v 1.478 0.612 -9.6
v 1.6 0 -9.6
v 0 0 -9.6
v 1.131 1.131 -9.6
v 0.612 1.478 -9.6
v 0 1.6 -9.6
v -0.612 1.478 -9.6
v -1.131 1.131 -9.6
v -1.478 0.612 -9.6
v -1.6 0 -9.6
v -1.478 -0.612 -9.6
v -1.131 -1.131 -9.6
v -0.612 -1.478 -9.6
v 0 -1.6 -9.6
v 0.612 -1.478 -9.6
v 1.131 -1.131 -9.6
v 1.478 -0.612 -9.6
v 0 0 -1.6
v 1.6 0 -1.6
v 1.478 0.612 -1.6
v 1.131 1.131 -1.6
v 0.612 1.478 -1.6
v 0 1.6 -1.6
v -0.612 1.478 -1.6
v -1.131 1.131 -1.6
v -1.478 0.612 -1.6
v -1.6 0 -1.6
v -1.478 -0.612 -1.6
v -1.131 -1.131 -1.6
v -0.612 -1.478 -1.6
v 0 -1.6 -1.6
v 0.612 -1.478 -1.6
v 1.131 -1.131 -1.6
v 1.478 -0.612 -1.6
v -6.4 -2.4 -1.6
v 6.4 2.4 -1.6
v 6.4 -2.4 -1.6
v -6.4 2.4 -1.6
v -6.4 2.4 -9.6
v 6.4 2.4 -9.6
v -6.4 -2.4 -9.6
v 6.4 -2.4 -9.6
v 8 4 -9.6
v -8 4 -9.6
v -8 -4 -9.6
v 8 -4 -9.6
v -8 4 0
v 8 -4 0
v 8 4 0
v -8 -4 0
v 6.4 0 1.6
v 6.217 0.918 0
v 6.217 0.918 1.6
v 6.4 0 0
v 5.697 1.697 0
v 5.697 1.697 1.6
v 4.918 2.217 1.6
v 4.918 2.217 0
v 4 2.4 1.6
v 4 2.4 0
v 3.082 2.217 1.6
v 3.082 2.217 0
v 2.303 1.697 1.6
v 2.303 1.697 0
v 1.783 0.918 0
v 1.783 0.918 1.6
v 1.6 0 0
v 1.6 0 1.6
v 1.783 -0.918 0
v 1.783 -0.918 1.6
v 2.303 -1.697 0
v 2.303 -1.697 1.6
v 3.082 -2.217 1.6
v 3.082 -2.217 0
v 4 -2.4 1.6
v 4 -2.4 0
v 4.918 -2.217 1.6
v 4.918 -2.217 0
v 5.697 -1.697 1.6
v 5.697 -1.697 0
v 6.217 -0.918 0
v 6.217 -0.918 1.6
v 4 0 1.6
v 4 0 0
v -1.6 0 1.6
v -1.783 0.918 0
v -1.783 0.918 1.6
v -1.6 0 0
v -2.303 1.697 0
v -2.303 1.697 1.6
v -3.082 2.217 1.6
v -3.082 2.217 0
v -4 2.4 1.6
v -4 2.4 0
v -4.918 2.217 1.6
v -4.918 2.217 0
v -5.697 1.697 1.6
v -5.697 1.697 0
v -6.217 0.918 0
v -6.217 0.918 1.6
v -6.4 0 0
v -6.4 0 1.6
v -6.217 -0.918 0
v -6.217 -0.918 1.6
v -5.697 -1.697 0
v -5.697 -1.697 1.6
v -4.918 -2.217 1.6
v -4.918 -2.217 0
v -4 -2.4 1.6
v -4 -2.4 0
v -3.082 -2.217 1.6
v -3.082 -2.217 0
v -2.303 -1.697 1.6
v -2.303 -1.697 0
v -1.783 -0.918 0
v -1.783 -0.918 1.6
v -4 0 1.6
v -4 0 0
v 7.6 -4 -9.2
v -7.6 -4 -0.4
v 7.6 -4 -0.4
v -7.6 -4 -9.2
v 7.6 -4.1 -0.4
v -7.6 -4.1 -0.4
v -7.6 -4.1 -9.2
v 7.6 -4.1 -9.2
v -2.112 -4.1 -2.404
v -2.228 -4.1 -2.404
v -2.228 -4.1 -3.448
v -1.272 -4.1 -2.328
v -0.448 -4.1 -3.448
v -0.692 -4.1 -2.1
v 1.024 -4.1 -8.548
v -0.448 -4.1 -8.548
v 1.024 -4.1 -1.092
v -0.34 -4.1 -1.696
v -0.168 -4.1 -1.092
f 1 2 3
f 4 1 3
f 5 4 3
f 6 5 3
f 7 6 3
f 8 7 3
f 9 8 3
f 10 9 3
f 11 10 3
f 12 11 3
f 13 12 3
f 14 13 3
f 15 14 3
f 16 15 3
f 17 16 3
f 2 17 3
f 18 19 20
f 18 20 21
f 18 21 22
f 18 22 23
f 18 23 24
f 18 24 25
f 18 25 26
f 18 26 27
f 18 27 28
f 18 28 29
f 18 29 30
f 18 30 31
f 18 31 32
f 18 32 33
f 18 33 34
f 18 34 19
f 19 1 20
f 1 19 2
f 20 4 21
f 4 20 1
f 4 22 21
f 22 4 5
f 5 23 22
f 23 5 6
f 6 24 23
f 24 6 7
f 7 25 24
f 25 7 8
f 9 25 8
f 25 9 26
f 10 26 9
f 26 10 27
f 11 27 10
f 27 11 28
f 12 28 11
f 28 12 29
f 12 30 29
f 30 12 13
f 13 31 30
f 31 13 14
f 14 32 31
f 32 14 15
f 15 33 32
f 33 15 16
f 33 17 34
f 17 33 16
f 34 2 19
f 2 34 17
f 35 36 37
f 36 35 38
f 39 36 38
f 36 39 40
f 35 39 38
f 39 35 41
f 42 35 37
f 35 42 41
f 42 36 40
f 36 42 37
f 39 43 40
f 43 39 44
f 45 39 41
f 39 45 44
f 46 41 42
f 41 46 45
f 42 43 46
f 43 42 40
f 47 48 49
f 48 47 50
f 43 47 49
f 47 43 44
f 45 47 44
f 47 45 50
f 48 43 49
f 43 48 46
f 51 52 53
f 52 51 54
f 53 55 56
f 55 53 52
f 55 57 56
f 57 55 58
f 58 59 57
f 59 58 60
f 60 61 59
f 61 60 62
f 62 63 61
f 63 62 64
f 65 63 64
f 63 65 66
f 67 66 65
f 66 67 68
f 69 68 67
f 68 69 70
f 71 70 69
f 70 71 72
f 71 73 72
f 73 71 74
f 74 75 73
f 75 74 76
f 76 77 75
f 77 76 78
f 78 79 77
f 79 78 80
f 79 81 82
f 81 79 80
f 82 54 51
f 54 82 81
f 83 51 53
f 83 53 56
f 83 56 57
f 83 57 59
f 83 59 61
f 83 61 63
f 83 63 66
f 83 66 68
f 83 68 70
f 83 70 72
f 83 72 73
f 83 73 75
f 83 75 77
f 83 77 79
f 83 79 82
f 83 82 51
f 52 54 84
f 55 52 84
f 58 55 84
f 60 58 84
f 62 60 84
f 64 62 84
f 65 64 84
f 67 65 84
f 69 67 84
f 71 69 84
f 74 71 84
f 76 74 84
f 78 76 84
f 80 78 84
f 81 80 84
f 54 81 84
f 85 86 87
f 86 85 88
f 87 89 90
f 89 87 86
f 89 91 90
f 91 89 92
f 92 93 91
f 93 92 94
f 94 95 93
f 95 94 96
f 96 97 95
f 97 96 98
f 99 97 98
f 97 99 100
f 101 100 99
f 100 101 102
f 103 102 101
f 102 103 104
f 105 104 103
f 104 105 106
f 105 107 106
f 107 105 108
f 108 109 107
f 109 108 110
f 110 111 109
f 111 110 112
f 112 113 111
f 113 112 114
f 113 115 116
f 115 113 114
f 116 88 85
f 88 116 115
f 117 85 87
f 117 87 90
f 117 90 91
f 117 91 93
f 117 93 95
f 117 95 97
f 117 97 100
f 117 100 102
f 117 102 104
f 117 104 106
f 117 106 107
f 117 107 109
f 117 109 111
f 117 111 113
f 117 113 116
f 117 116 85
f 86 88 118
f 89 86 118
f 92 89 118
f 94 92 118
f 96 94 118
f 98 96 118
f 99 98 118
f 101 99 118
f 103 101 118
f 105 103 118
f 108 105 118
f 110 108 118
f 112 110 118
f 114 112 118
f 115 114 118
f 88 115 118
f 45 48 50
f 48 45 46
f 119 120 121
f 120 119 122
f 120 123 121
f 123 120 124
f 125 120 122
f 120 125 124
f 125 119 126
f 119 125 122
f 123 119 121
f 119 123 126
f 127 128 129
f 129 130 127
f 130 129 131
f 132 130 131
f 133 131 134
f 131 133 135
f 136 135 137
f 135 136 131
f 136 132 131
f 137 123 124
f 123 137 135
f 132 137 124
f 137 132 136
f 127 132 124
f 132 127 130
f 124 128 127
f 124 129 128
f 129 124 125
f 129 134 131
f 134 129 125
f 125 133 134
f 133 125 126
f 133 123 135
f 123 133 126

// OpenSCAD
// file: ../p/4-4edge.scad
use <../lib.scad>
function ldraw_lib__4_4edge() = [
// 0 Circle 1.0
// 0 Name: 4-4edge.dat
// 0 Author: James Jessiman
// 0 !LDRAW_ORG Primitive UPDATE 2017-01
// 0 !LICENSE Licensed under CC BY 2.0 and CC BY 4.0 : see CAreadme.txt
// 
// 0 BFC CERTIFY CCW
  [0,"BFC","CERTIFY"],
  [0,"BFC","CCW"],
// 
// 0 !HISTORY 1998-12-15 [PTadmin] Official Update 1998-10
// 0 !HISTORY 2005-12-28 [PTadmin] Official Update 2005-01
// 0 !HISTORY 2007-06-24 [PTadmin] Header formatted for Contributor Agreement
// 0 !HISTORY 2008-07-01 [PTadmin] Official Update 2008-01
// 0 !HISTORY 2017-01-15 [Steffen] BFCed
// 0 !HISTORY 2017-12-30 [PTadmin] Official Update 2017-01
// 
// 
// 2 24 1 0 0 0.9239 0 0.3827
  [2,24,1,0,0,0.9239,0,0.3827],
// 2 24 0.9239 0 0.3827 0.7071 0 0.7071
  [2,24,0.9239,0,0.3827,0.7071,0,0.7071],
// 2 24 0.7071 0 0.7071 0.3827 0 0.9239
  [2,24,0.7071,0,0.7071,0.3827,0,0.9239],
// 2 24 0.3827 0 0.9239 0 0 1
  [2,24,0.3827,0,0.9239,0,0,1],
// 2 24 0 0 1 -0.3827 0 0.9239
  [2,24,0,0,1,-0.3827,0,0.9239],
// 2 24 -0.3827 0 0.9239 -0.7071 0 0.7071
  [2,24,-0.3827,0,0.9239,-0.7071,0,0.7071],
// 2 24 -0.7071 0 0.7071 -0.9239 0 0.3827
  [2,24,-0.7071,0,0.7071,-0.9239,0,0.3827],
// 2 24 -0.9239 0 0.3827 -1 0 -0
  [2,24,-0.9239,0,0.3827,-1,0,-0],
// 2 24 -1 0 -0 -0.9239 0 -0.3827
  [2,24,-1,0,-0,-0.9239,0,-0.3827],
// 2 24 -0.9239 0 -0.3827 -0.7071 0 -0.7071
  [2,24,-0.9239,0,-0.3827,-0.7071,0,-0.7071],
// 2 24 -0.7071 0 -0.7071 -0.3827 0 -0.9239
  [2,24,-0.7071,0,-0.7071,-0.3827,0,-0.9239],
// 2 24 -0.3827 0 -0.9239 0 0 -1
  [2,24,-0.3827,0,-0.9239,0,0,-1],
// 2 24 0 0 -1 0.3827 0 -0.9239
  [2,24,0,0,-1,0.3827,0,-0.9239],
// 2 24 0.3827 0 -0.9239 0.7071 0 -0.7071
  [2,24,0.3827,0,-0.9239,0.7071,0,-0.7071],
// 2 24 0.7071 0 -0.7071 0.9239 0 -0.3827
  [2,24,0.7071,0,-0.7071,0.9239,0,-0.3827],
// 2 24 0.9239 0 -0.3827 1 0 0
  [2,24,0.9239,0,-0.3827,1,0,0],
];
module ldraw_lib__4_4edge(step=0, col=false, unit=2/5, alt=false, line=0.2, solid=!$preview)
    makepoly(ldraw_lib__4_4edge(), step=step, col=col, unit=unit, alt=alt, line=line, solid=solid);
ldraw_lib__4_4edge(line=0.2);
// file: ../p/4-4disc.scad
use <../lib.scad>
function ldraw_lib__4_4disc() = [
// 0 Disc 1.0
// 0 Name: 4-4disc.dat
// 0 Author: James Jessiman
// 0 !LDRAW_ORG Primitive UPDATE 2002-02
// 0 !LICENSE Licensed under CC BY 2.0 and CC BY 4.0 : see CAreadme.txt
// 
// 0 BFC CERTIFY CCW
  [0,"BFC","CERTIFY"],
  [0,"BFC","CCW"],
// 
// 0 !HISTORY 1998-12-15 [PTadmin] Official Update 1998-10
// 0 !HISTORY 2002-03-23 [sbliss] Added BFC statement
// 0 !HISTORY 2002-04-25 [PTadmin] Official Update 2002-02
// 0 !HISTORY 2007-06-24 [PTadmin] Header formatted for Contributor Agreement
// 0 !HISTORY 2008-07-01 [PTadmin] Official Update 2008-01
// 
// 
// 3 16 0 0 0 1 0 0 0.9239 0 0.3827
  [3,16,0,0,0,1,0,0,0.9239,0,0.3827],
// 3 16 0 0 0 0.9239 0 0.3827 0.7071 0 0.7071
  [3,16,0,0,0,0.9239,0,0.3827,0.7071,0,0.7071],
// 3 16 0 0 0 0.7071 0 0.7071 0.3827 0 0.9239
  [3,16,0,0,0,0.7071,0,0.7071,0.3827,0,0.9239],
// 3 16 0 0 0 0.3827 0 0.9239 0 0 1
  [3,16,0,0,0,0.3827,0,0.9239,0,0,1],
// 3 16 0 0 0 0 0 1 -0.3827 0 0.9239
  [3,16,0,0,0,0,0,1,-0.3827,0,0.9239],
// 3 16 0 0 0 -0.3827 0 0.9239 -0.7071 0 0.7071
  [3,16,0,0,0,-0.3827,0,0.9239,-0.7071,0,0.7071],
// 3 16 0 0 0 -0.7071 0 0.7071 -0.9239 0 0.3827
  [3,16,0,0,0,-0.7071,0,0.7071,-0.9239,0,0.3827],
// 3 16 0 0 0 -0.9239 0 0.3827 -1 0 -0
  [3,16,0,0,0,-0.9239,0,0.3827,-1,0,-0],
// 3 16 0 0 0 -1 0 -0 -0.9239 0 -0.3827
  [3,16,0,0,0,-1,0,-0,-0.9239,0,-0.3827],
// 3 16 0 0 0 -0.9239 0 -0.3827 -0.7071 0 -0.7071
  [3,16,0,0,0,-0.9239,0,-0.3827,-0.7071,0,-0.7071],
// 3 16 0 0 0 -0.7071 0 -0.7071 -0.3827 0 -0.9239
  [3,16,0,0,0,-0.7071,0,-0.7071,-0.3827,0,-0.9239],
// 3 16 0 0 0 -0.3827 0 -0.9239 0 0 -1
  [3,16,0,0,0,-0.3827,0,-0.9239,0,0,-1],
// 3 16 0 0 0 0 0 -1 0.3827 0 -0.9239
  [3,16,0,0,0,0,0,-1,0.3827,0,-0.9239],
// 3 16 0 0 0 0.3827 0 -0.9239 0.7071 0 -0.7071
  [3,16,0,0,0,0.3827,0,-0.9239,0.7071,0,-0.7071],
// 3 16 0 0 0 0.7071 0 -0.7071 0.9239 0 -0.3827
  [3,16,0,0,0,0.7071,0,-0.7071,0.9239,0,-0.3827],
// 3 16 0 0 0 0.9239 0 -0.3827 1 0 0
  [3,16,0,0,0,0.9239,0,-0.3827,1,0,0],
// 0
];
module ldraw_lib__4_4disc(step=0, col=false, unit=2/5, alt=false, line=0.2, solid=!$preview)
    makepoly(ldraw_lib__4_4disc(), step=step, col=col, unit=unit, alt=alt, line=line, solid=solid);
ldraw_lib__4_4disc(line=0.2);
// file: ../p/4-4cyli.scad
use <../lib.scad>
$fa=1; $fs=0.2;
function ldraw_lib__4_4cyli(realsolid=false) = [
// 0 Cylinder 1.0
// 0 Name: 4-4cyli.dat
// 0 Author: James Jessiman
// 0 !LDRAW_ORG Primitive UPDATE 2005-01
// 0 !LICENSE Licensed under CC BY 2.0 and CC BY 4.0 : see CAreadme.txt
// 
// 0 BFC CERTIFY CCW
  [0,"BFC","CERTIFY"],
  [0,"BFC","CCW"],
// 
// 0 !HISTORY 1998-12-15 [PTadmin] Official Update 1998-10
// 0 !HISTORY 2002-03-23 [sbliss] Added BFC statement; merged headers from files in distributions LDraw 0.27 and Complete.
// 0 !HISTORY 2002-04-25 [PTadmin] Official Update 2002-02
// 0 !HISTORY 2004-12-14 [guyvivan] BFC CCW
// 0 !HISTORY 2005-12-28 [PTadmin] Official Update 2005-01
// 0 !HISTORY 2007-06-24 [PTadmin] Header formatted for Contributor Agreement
// 0 !HISTORY 2008-07-01 [PTadmin] Official Update 2008-01
// 
// 
// 4 16 1 1 0 0.9239 1 0.3827 0.9239 0 0.3827 1 0 0
  [4,16,1,1,0,0.9239,1,0.3827,0.9239,0,0.3827,1,0,0],
// 5 24 1 0 0 1 1 0 0.9239 0 0.3827 0.9239 0 -0.3827
  [5,24,1,0,0,1,1,0,0.9239,0,0.3827,0.9239,0,-0.3827],
// 4 16 0.9239 1 0.3827 0.7071 1 0.7071 0.7071 0 0.7071 0.9239 0 0.3827
  [4,16,0.9239,1,0.3827,0.7071,1,0.7071,0.7071,0,0.7071,0.9239,0,0.3827],
// 5 24 0.9239 0 0.3827 0.9239 1 0.3827 0.7071 0 0.7071 1 0 0
  [5,24,0.9239,0,0.3827,0.9239,1,0.3827,0.7071,0,0.7071,1,0,0],
// 4 16 0.7071 1 0.7071 0.3827 1 0.9239 0.3827 0 0.9239 0.7071 0 0.7071
  [4,16,0.7071,1,0.7071,0.3827,1,0.9239,0.3827,0,0.9239,0.7071,0,0.7071],
// 5 24 0.7071 0 0.7071 0.7071 1 0.7071 0.3827 0 0.9239 0.9239 0 0.3827
  [5,24,0.7071,0,0.7071,0.7071,1,0.7071,0.3827,0,0.9239,0.9239,0,0.3827],
// 4 16 0.3827 1 0.9239 0 1 1 0 0 1 0.3827 0 0.9239
  [4,16,0.3827,1,0.9239,0,1,1,0,0,1,0.3827,0,0.9239],
// 5 24 0.3827 0 0.9239 0.3827 1 0.9239 0 0 1 0.7071 0 0.7071
  [5,24,0.3827,0,0.9239,0.3827,1,0.9239,0,0,1,0.7071,0,0.7071],
// 4 16 0 1 1 -0.3827 1 0.9239 -0.3827 0 0.9239 0 0 1
  [4,16,0,1,1,-0.3827,1,0.9239,-0.3827,0,0.9239,0,0,1],
// 5 24 0 0 1 0 1 1 -0.3827 0 0.9239 0.3827 0 0.9239
  [5,24,0,0,1,0,1,1,-0.3827,0,0.9239,0.3827,0,0.9239],
// 4 16 -0.3827 1 0.9239 -0.7071 1 0.7071 -0.7071 0 0.7071 -0.3827 0 0.9239
  [4,16,-0.3827,1,0.9239,-0.7071,1,0.7071,-0.7071,0,0.7071,-0.3827,0,0.9239],
// 5 24 -0.3827 0 0.9239 -0.3827 1 0.9239 -0.7071 0 0.7071 0 0 1
  [5,24,-0.3827,0,0.9239,-0.3827,1,0.9239,-0.7071,0,0.7071,0,0,1],
// 4 16 -0.7071 1 0.7071 -0.9239 1 0.3827 -0.9239 0 0.3827 -0.7071 0 0.7071
  [4,16,-0.7071,1,0.7071,-0.9239,1,0.3827,-0.9239,0,0.3827,-0.7071,0,0.7071],
// 5 24 -0.7071 0 0.7071 -0.7071 1 0.7071 -0.9239 0 0.3827 -0.3827 0 0.9239
  [5,24,-0.7071,0,0.7071,-0.7071,1,0.7071,-0.9239,0,0.3827,-0.3827,0,0.9239],
// 4 16 -0.9239 1 0.3827 -1 1 0 -1 0 0 -0.9239 0 0.3827
  [4,16,-0.9239,1,0.3827,-1,1,0,-1,0,0,-0.9239,0,0.3827],
// 5 24 -0.9239 0 0.3827 -0.9239 1 0.3827 -1 0 0 -0.7071 0 0.7071
  [5,24,-0.9239,0,0.3827,-0.9239,1,0.3827,-1,0,0,-0.7071,0,0.7071],
// 4 16 -1 1 0 -0.9239 1 -0.3827 -0.9239 0 -0.3827 -1 0 0
  [4,16,-1,1,0,-0.9239,1,-0.3827,-0.9239,0,-0.3827,-1,0,0],
// 5 24 -1 0 0 -1 1 0 -0.9239 0 -0.3827 -0.9239 0 0.3827
  [5,24,-1,0,0,-1,1,0,-0.9239,0,-0.3827,-0.9239,0,0.3827],
// 4 16 -0.9239 1 -0.3827 -0.7071 1 -0.7071 -0.7071 0 -0.7071 -0.9239 0 -0.3827
  [4,16,-0.9239,1,-0.3827,-0.7071,1,-0.7071,-0.7071,0,-0.7071,-0.9239,0,-0.3827],
// 5 24 -0.9239 0 -0.3827 -0.9239 1 -0.3827 -0.7071 0 -0.7071 -1 0 0
  [5,24,-0.9239,0,-0.3827,-0.9239,1,-0.3827,-0.7071,0,-0.7071,-1,0,0],
// 4 16 -0.7071 1 -0.7071 -0.3827 1 -0.9239 -0.3827 0 -0.9239 -0.7071 0 -0.7071
  [4,16,-0.7071,1,-0.7071,-0.3827,1,-0.9239,-0.3827,0,-0.9239,-0.7071,0,-0.7071],
// 5 24 -0.7071 0 -0.7071 -0.7071 1 -0.7071 -0.3827 0 -0.9239 -0.9239 0 -0.3827
  [5,24,-0.7071,0,-0.7071,-0.7071,1,-0.7071,-0.3827,0,-0.9239,-0.9239,0,-0.3827],
// 4 16 -0.3827 1 -0.9239 0 1 -1 0 0 -1 -0.3827 0 -0.9239
  [4,16,-0.3827,1,-0.9239,0,1,-1,0,0,-1,-0.3827,0,-0.9239],
// 5 24 -0.3827 0 -0.9239 -0.3827 1 -0.9239 0 0 -1 -0.7071 0 -0.7071
  [5,24,-0.3827,0,-0.9239,-0.3827,1,-0.9239,0,0,-1,-0.7071,0,-0.7071],
// 4 16 0 1 -1 0.3827 1 -0.9239 0.3827 0 -0.9239 0 0 -1
  [4,16,0,1,-1,0.3827,1,-0.9239,0.3827,0,-0.9239,0,0,-1],
// 5 24 0 0 -1 0 1 -1 0.3827 0 -0.9239 -0.3827 0 -0.9239
  [5,24,0,0,-1,0,1,-1,0.3827,0,-0.9239,-0.3827,0,-0.9239],
// 4 16 0.3827 1 -0.9239 0.7071 1 -0.7071 0.7071 0 -0.7071 0.3827 0 -0.9239
  [4,16,0.3827,1,-0.9239,0.7071,1,-0.7071,0.7071,0,-0.7071,0.3827,0,-0.9239],
// 5 24 0.3827 0 -0.9239 0.3827 1 -0.9239 0.7071 0 -0.7071 0 0 -1
  [5,24,0.3827,0,-0.9239,0.3827,1,-0.9239,0.7071,0,-0.7071,0,0,-1],
// 4 16 0.7071 1 -0.7071 0.9239 1 -0.3827 0.9239 0 -0.3827 0.7071 0 -0.7071
  [4,16,0.7071,1,-0.7071,0.9239,1,-0.3827,0.9239,0,-0.3827,0.7071,0,-0.7071],
// 5 24 0.7071 0 -0.7071 0.7071 1 -0.7071 0.9239 0 -0.3827 0.3827 0 -0.9239
  [5,24,0.7071,0,-0.7071,0.7071,1,-0.7071,0.9239,0,-0.3827,0.3827,0,-0.9239],
// 4 16 0.9239 1 -0.3827 1 1 0 1 0 0 0.9239 0 -0.3827
  [4,16,0.9239,1,-0.3827,1,1,0,1,0,0,0.9239,0,-0.3827],
// 5 24 0.9239 0 -0.3827 0.9239 1 -0.3827 1 0 0 0.7071 0 -0.7071
  [5,24,0.9239,0,-0.3827,0.9239,1,-0.3827,1,0,0,0.7071,0,-0.7071],
// 0
];
module ldraw_lib__4_4cyli(step=0, col=false, unit=2/5, alt=false, line=0.2, solid=!$preview)
    makepoly(ldraw_lib__4_4cyli(solid), step=step, col=col, unit=unit, alt=alt, line=line, solid=solid);
ldraw_lib__4_4cyli(line=0.2);
// file: ../p/stud3.scad
use <../lib.scad>
use <4-4cyli.scad>
use <4-4disc.scad>
use <4-4edge.scad>
function ldraw_lib__stud3() = [
// 0 Stud Tube Solid
// 0 Name: stud3.dat
// 0 Author: James Jessiman
// 0 !LDRAW_ORG Primitive UPDATE 2012-01
// 0 !LICENSE Licensed under CC BY 4.0 : see CAreadme.txt
// 
// 0 BFC CERTIFY CCW
  [0,"BFC","CERTIFY"],
  [0,"BFC","CCW"],
// 
// 0 !HISTORY 2002-04-04 [sbliss] Modified for BFC compliance
// 0 !HISTORY 2002-04-25 [PTadmin] Official Update 2002-02
// 0 !HISTORY 2007-06-24 [PTadmin] Header formatted for Contributor Agreement
// 0 !HISTORY 2008-07-01 [PTadmin] Official Update 2008-01
// 0 !HISTORY 2012-02-16 [Philo] Changed to CCW
// 0 !HISTORY 2012-03-30 [PTadmin] Official Update 2012-01
// 
// 
// 1 16 0 -4 0 4 0 0 0 1 0 0 0 4 4-4edge.dat
  [1,16,0,-4,0,4,0,0,0,1,0,0,0,4, ldraw_lib__4_4edge()],
// 1 16 0 0 0 4 0 0 0 1 0 0 0 4 4-4edge.dat
  [1,16,0,0,0,4,0,0,0,1,0,0,0,4, ldraw_lib__4_4edge()],
// 1 16 0 -4 0 4 0 0 0 1 0 0 0 4 4-4disc.dat
  [1,16,0,-4,0,4,0,0,0,1,0,0,0,4, ldraw_lib__4_4disc()],
  [-1,16,0,0,0,4,0,0,0,-1,0,0,0,4, ldraw_lib__4_4disc()],
// 1 16 0 -4 0 4 0 0 0 4 0 0 0 4 4-4cyli.dat
  [1,16,0,-4,0,4,0,0,0,4,0,0,0,4, ldraw_lib__4_4cyli()],
];
module ldraw_lib__stud3(step=0, col=false, unit=2/5, alt=false, line=0.2, solid=!$preview)
    makepoly(ldraw_lib__stud3(), step=step, col=col, unit=unit, alt=alt, line=line, solid=solid);
ldraw_lib__stud3(line=0.2);
// file: ../p/stud.scad
use <../lib.scad>
use <4-4cyli.scad>
use <4-4disc.scad>
use <4-4edge.scad>
function ldraw_lib__stud() = [
// 0 Stud
// 0 Name: stud.dat
// 0 Author: James Jessiman
// 0 !LDRAW_ORG Primitive UPDATE 2012-01
// 0 !LICENSE Licensed under CC BY 4.0 : see CAreadme.txt
// 
// 0 BFC CERTIFY CCW
  [0,"BFC","CERTIFY"],
  [0,"BFC","CCW"],
// 
// 0 !HISTORY 2002-04-04 [sbliss] Modified for BFC compliance
// 0 !HISTORY 2002-04-25 [PTadmin] Official Update 2002-02
// 0 !HISTORY 2007-06-24 [PTadmin] Header formatted for Contributor Agreement
// 0 !HISTORY 2008-07-01 [PTadmin] Official Update 2008-01
// 0 !HISTORY 2012-02-16 [Philo] Changed to CCW
// 0 !HISTORY 2012-03-30 [PTadmin] Official Update 2012-01
// 
// 
// 1 16 0 0 0 6 0 0 0 1 0 0 0 6 4-4edge.dat
  [1,16,0,0,0,6,0,0,0,1,0,0,0,6, ldraw_lib__4_4edge()],
// 1 16 0 -4 0 6 0 0 0 1 0 0 0 6 4-4edge.dat
  [1,16,0,-4,0,6,0,0,0,1,0,0,0,6, ldraw_lib__4_4edge()],
// 1 16 0 0 0 6 0 0 0 -4 0 0 0 6 4-4cyli.dat
  [1,16,0,0,0,6,0,0,0,-4,0,0,0,6, ldraw_lib__4_4cyli()],
// 1 16 0 -4 0 6 0 0 0 1 0 0 0 6 4-4disc.dat
  [1,16,0,-4,0,6,0,0,0,1,0,0,0,6, ldraw_lib__4_4disc()],
  [-1,16,0,0,0,6,0,0,0,-1,0,0,0,6, ldraw_lib__4_4disc()],
];
module ldraw_lib__stud(step=0, col=false, unit=2/5, alt=false, line=0.2, solid=!$preview)
    makepoly(ldraw_lib__stud(), step=step, col=col, unit=unit, alt=alt, line=line, solid=solid);
ldraw_lib__stud(line=0.2);
// file: ../p/box5.scad
use <../lib.scad>
function ldraw_lib__box5() = [
// 0 Box with 5 Faces and All Edges
// 0 Name: box5.dat
// 0 Author: James Jessiman
// 0 !LDRAW_ORG Primitive UPDATE 2012-01
// 0 !LICENSE Licensed under CC BY 2.0 and CC BY 4.0 : see CAreadme.txt
// 
// 0 BFC CERTIFY CCW
  [0,"BFC","CERTIFY"],
  [0,"BFC","CCW"],
// 
// 0 !HISTORY 2002-04-03 [sbliss] Modified for BFC compliance
// 0 !HISTORY 2002-04-25 [PTadmin] Official Update 2002-02
// 0 !HISTORY 2007-06-24 [PTadmin] Header formatted for Contributor Agreement
// 0 !HISTORY 2008-07-01 [PTadmin] Official Update 2008-01
// 0 !HISTORY 2012-02-16 [Philo] Changed to CCW
// 0 !HISTORY 2012-03-30 [PTadmin] Official Update 2012-01
// 
// 
// 2 24 1 1 1 -1 1 1
  [2,24,1,1,1,-1,1,1],
// 2 24 -1 1 1 -1 1 -1
  [2,24,-1,1,1,-1,1,-1],
// 2 24 -1 1 -1 1 1 -1
  [2,24,-1,1,-1,1,1,-1],
// 2 24 1 1 -1 1 1 1
  [2,24,1,1,-1,1,1,1],
// 2 24 1 0 1 -1 0 1
  [2,24,1,0,1,-1,0,1],
// 2 24 -1 0 1 -1 0 -1
  [2,24,-1,0,1,-1,0,-1],
// 2 24 -1 0 -1 1 0 -1
  [2,24,-1,0,-1,1,0,-1],
// 2 24 1 0 -1 1 0 1
  [2,24,1,0,-1,1,0,1],
// 2 24 1 0 1 1 1 1
  [2,24,1,0,1,1,1,1],
// 2 24 -1 0 1 -1 1 1
  [2,24,-1,0,1,-1,1,1],
// 2 24 1 0 -1 1 1 -1
  [2,24,1,0,-1,1,1,-1],
// 2 24 -1 0 -1 -1 1 -1
  [2,24,-1,0,-1,-1,1,-1],
// 4 16 -1 1 1 1 1 1 1 1 -1 -1 1 -1
  [4,16,-1,1,1,1,1,1,1,1,-1,-1,1,-1],
// 4 16 -1 1 1 -1 0 1 1 0 1 1 1 1
  [4,16,-1,1,1,-1,0,1,1,0,1,1,1,1],
// 4 16 -1 1 -1 -1 0 -1 -1 0 1 -1 1 1
  [4,16,-1,1,-1,-1,0,-1,-1,0,1,-1,1,1],
// 4 16 1 1 -1 1 0 -1 -1 0 -1 -1 1 -1
  [4,16,1,1,-1,1,0,-1,-1,0,-1,-1,1,-1],
// 4 16 1 1 1 1 0 1 1 0 -1 1 1 -1
  [4,16,1,1,1,1,0,1,1,0,-1,1,1,-1],
];
makepoly(ldraw_lib__box5(), line=0.2);
// file: ../p/box4t.scad
use <../lib.scad>
function ldraw_lib__box4t() = [
// 0 Box with 4 Adjacent Faces and All Edges
// 0 Name: box4t.dat
// 0 Author: Tore Eriksson [Tore_Eriksson]
// 0 !LDRAW_ORG Primitive UPDATE 2003-02
// 0 !LICENSE Licensed under CC BY 2.0 and CC BY 4.0 : see CAreadme.txt
// 
// 0 BFC CERTIFY CCW
  [0,"BFC","CERTIFY"],
  [0,"BFC","CCW"],
// 
// 0 !HISTORY 1997-09-29 [PTadmin] Official Update 1997-15
// 0 !HISTORY 2002-08-31 [izanette] Modified with WINDZ for BFC compliance
// 0 !HISTORY 2003-08-01 [PTadmin] Official Update 2003-02
// 0 !HISTORY 2007-06-24 [PTadmin] Header formatted for Contributor Agreement
// 0 !HISTORY 2008-07-01 [PTadmin] Official Update 2008-01
// 
// 
// 2 24 1 1 1 -1 1 1
  [2,24,1,1,1,-1,1,1],
// 2 24 -1 1 1 -1 1 -1
  [2,24,-1,1,1,-1,1,-1],
// 2 24 -1 1 -1 1 1 -1
  [2,24,-1,1,-1,1,1,-1],
// 2 24 1 1 -1 1 1 1
  [2,24,1,1,-1,1,1,1],
// 2 24 1 0 1 -1 0 1
  [2,24,1,0,1,-1,0,1],
// 2 24 -1 0 1 -1 0 -1
  [2,24,-1,0,1,-1,0,-1],
// 2 24 -1 0 -1 1 0 -1
  [2,24,-1,0,-1,1,0,-1],
// 2 24 1 0 -1 1 0 1
  [2,24,1,0,-1,1,0,1],
// 2 24 1 0 1 1 1 1
  [2,24,1,0,1,1,1,1],
// 2 24 -1 0 1 -1 1 1
  [2,24,-1,0,1,-1,1,1],
// 2 24 1 0 -1 1 1 -1
  [2,24,1,0,-1,1,1,-1],
// 2 24 -1 0 -1 -1 1 -1
  [2,24,-1,0,-1,-1,1,-1],
// 4 16 1 1 1 1 1 -1 -1 1 -1 -1 1 1
  [4,16,1,1,1,1,1,-1,-1,1,-1,-1,1,1],
// 4 16 1 1 1 -1 1 1 -1 0 1 1 0 1
  [4,16,1,1,1,-1,1,1,-1,0,1,1,0,1],
// 4 16 -1 1 1 -1 1 -1 -1 0 -1 -1 0 1
  [4,16,-1,1,1,-1,1,-1,-1,0,-1,-1,0,1],
// 0 4 16 -1 1 -1 -1 0 -1 1 0 -1 1 1 -1
// 4 16 1 1 -1 1 1 1 1 0 1 1 0 -1
  [4,16,1,1,-1,1,1,1,1,0,1,1,0,-1],
// 0
];
makepoly(ldraw_lib__box4t(), line=0.2);
// file: s/3004s01.scad
use <../../lib.scad>
use <../../p/box4t.scad>
use <../../p/box5.scad>
use <../../p/stud.scad>
use <../../p/stud3.scad>
$fa=1; $fs=0.2;
function ldraw_lib__s__3004s01(realsolid=false) = [
// 0 ~Brick  1 x  2 without Front Face
// 0 Name: s\3004s01.dat
// 0 Author: James Jessiman
// 0 !LDRAW_ORG Subpart UPDATE 2003-03
// 0 !LICENSE Licensed under CC BY 2.0 and CC BY 4.0 : see CAreadme.txt
// 
// 0 BFC CERTIFY CCW
  [0,"BFC","CERTIFY"],
  [0,"BFC","CCW"],
// 
// 0 !HISTORY 2003-09-07 [jriley] Subfiling, BFC
// 0 !HISTORY 2003-12-19 [PTadmin] Official Update 2003-03
// 0 !HISTORY 2007-08-29 [PTadmin] Header formatted for Contributor Agreement
// 0 !HISTORY 2008-07-01 [PTadmin] Official Update 2008-01
// 
// 
// 1 16 0 4 0 1 0 0 0 -5 0 0 0 1 stud3.dat
  [1,16,0,4,0,1,0,0,0,-5,0,0,0,1, ldraw_lib__stud3(realsolid)],
// 0 BFC INVERTNEXT
  [0,"BFC","INVERTNEXT"],
// 1 16 0 24 0 16 0 0 0 -20 0 0 0 6 box5.dat
  [1,16,0,24,0,16,0,0,0,-20,0,0,0,6, ldraw_lib__box5(realsolid)],
// 4 16 20 24 10 16 24 6 -16 24 6 -20 24 10
  [4,16,20,24,10,16,24,6,-16,24,6,-20,24,10],
// 4 16 -20 24 10 -16 24 6 -16 24 -6 -20 24 -10
  [4,16,-20,24,10,-16,24,6,-16,24,-6,-20,24,-10],
// 4 16 -20 24 -10 -16 24 -6 16 24 -6 20 24 -10
  [4,16,-20,24,-10,-16,24,-6,16,24,-6,20,24,-10],
// 4 16 20 24 -10 16 24 -6 16 24 6 20 24 10
  [4,16,20,24,-10,16,24,-6,16,24,6,20,24,10],
// 1 16 0 24 0 20 0 0 0 -24 0 0 0 10 box4t.dat
  [1,16,0,24,0,20,0,0,0,-24,0,0,0,10, ldraw_lib__box4t(realsolid)],
// 1 16 10 0 0 1 0 0 0 1 0 0 0 1 stud.dat
  [1,16,10,0,0,1,0,0,0,1,0,0,0,1, ldraw_lib__stud(realsolid)],
// 1 16 -10 0 0 1 0 0 0 1 0 0 0 1 stud.dat
  [1,16,-10,0,0,1,0,0,0,1,0,0,0,1, ldraw_lib__stud(realsolid)],
// 0
];
module ldraw_lib__s__3004s01(step=0, col=false, unit=2/5, alt=false, line=0.2, solid=!$preview)
    makepoly(ldraw_lib__s__3004s01(solid), step=step, col=col, unit=unit, alt=alt, line=line, solid=solid);
ldraw_lib__s__3004s01(line=0.2);
// file: s/004452bs02.scad
use <../../lib.scad>
function ldraw_lib__s__004452bs02() = [
// 0 ~Sticker  1.1 x  1.9 with Number "1" - Background
// 0 Name: s\004452bs02.dat
// 0 Author: Takeshi Takahashi [RainbowDolphin]
// 0 !LDRAW_ORG Subpart UPDATE 2022-04
// 0 !LICENSE Licensed under CC BY 2.0 and CC BY 4.0 : see CAreadme.txt
// 
// 0 BFC CERTIFY CCW
  [0,"BFC","CERTIFY"],
  [0,"BFC","CCW"],
// 
// 0 !HISTORY 2022-07-18 [PTadmin] Official Update 2022-04
// 
// 
// 4 16 -19 -.25 11 -.42 -.25 9.27 2.56 -.25 9.27 19 -.25 11
  [4,16,-19,-.25,11,-.42,-.25,9.27,2.56,-.25,9.27,19,-.25,11],
// 4 16 -.85 -.25 7.76 -.42 -.25 9.27 -19 -.25 11 -1.73 -.25 6.75
  [4,16,-.85,-.25,7.76,-.42,-.25,9.27,-19,-.25,11,-1.73,-.25,6.75],
// 4 16 -3.18 -.25 6.18 -1.73 -.25 6.75 -19 -.25 11 -5.28 -.25 5.99
  [4,16,-3.18,-.25,6.18,-1.73,-.25,6.75,-19,-.25,11,-5.28,-.25,5.99],
// 3 16 -19 -.25 11 -5.57 -.25 5.99 -5.28 -.25 5.99
  [3,16,-19,-.25,11,-5.57,-.25,5.99,-5.28,-.25,5.99],
// 4 16 -5.57 -.25 3.38 -5.57 -.25 5.99 -19 -.25 11 -19 -.25 -11
  [4,16,-5.57,-.25,3.38,-5.57,-.25,5.99,-19,-.25,11,-19,-.25,-11],
// 4 16 -1.12 -.25 3.38 -5.57 -.25 3.38 -19 -.25 -11 -1.12 -.25 -9.37
  [4,16,-1.12,-.25,3.38,-5.57,-.25,3.38,-19,-.25,-11,-1.12,-.25,-9.37],
// 4 16 2.56 -.25 -9.37 -1.12 -.25 -9.37 -19 -.25 -11 19 -.25 -11
  [4,16,2.56,-.25,-9.37,-1.12,-.25,-9.37,-19,-.25,-11,19,-.25,-11],
// 4 16 2.56 -.25 9.27 2.56 -.25 -9.37 19 -.25 -11 19 -.25 11
  [4,16,2.56,-.25,9.27,2.56,-.25,-9.37,19,-.25,-11,19,-.25,11],
];
module ldraw_lib__s__004452bs02(step=0, col=false, unit=2/5, alt=false, line=0.2, solid=!$preview)
    makepoly(ldraw_lib__s__004452bs02(), step=step, col=col, unit=unit, alt=alt, line=line, solid=solid);
ldraw_lib__s__004452bs02(line=0.2);
// file: s/004452bs01.scad
use <../../lib.scad>
function ldraw_lib__s__004452bs01() = [
// 0 ~Sticker  1.1 x  1.9 with Number "1" - Type Face
// 0 Name: s\004452bs01.dat
// 0 Author: Takeshi Takahashi [RainbowDolphin]
// 0 !LDRAW_ORG Subpart UPDATE 2022-04
// 0 !LICENSE Licensed under CC BY 4.0 : see CAreadme.txt
// 
// 0 BFC CERTIFY CCW
  [0,"BFC","CERTIFY"],
  [0,"BFC","CCW"],
// 
// 0 !HISTORY 2022-07-18 [PTadmin] Official Update 2022-04
// 
// 
// 3 16 -5.28 -.25 5.99 -5.57 -.25 5.99 -5.57 -.25 3.38
  [3,16,-5.28,-.25,5.99,-5.57,-.25,5.99,-5.57,-.25,3.38],
// 4 16 -3.18 -.25 6.18 -5.28 -.25 5.99 -5.57 -.25 3.38 -1.12 -.25 3.38
  [4,16,-3.18,-.25,6.18,-5.28,-.25,5.99,-5.57,-.25,3.38,-1.12,-.25,3.38],
// 3 16 -1.73 -.25 6.75 -3.18 -.25 6.18 -1.12 -.25 3.38
  [3,16,-1.73,-.25,6.75,-3.18,-.25,6.18,-1.12,-.25,3.38],
// 4 16 -1.12 -.25 3.38 -1.12 -.25 -9.37 2.56 -.25 -9.37 2.56 -.25 9.27
  [4,16,-1.12,-.25,3.38,-1.12,-.25,-9.37,2.56,-.25,-9.37,2.56,-.25,9.27],
// 4 16 2.56 -.25 9.27 -.42 -.25 9.27 -.85 -.25 7.76 -1.12 -.25 3.38
  [4,16,2.56,-.25,9.27,-.42,-.25,9.27,-.85,-.25,7.76,-1.12,-.25,3.38],
// 3 16 -.85 -.25 7.76 -1.73 -.25 6.75 -1.12 -.25 3.38
  [3,16,-.85,-.25,7.76,-1.73,-.25,6.75,-1.12,-.25,3.38],
];
module ldraw_lib__s__004452bs01(step=0, col=false, unit=2/5, alt=false, line=0.2, solid=!$preview)
    makepoly(ldraw_lib__s__004452bs01(), step=step, col=col, unit=unit, alt=alt, line=line, solid=solid);
ldraw_lib__s__004452bs01(line=0.2);
// file: ../p/box5-12.scad
use <../lib.scad>
function ldraw_lib__box5_12() = [
// 0 Box with 5 Faces without Any Edges
// 0 Name: box5-12.dat
// 0 Author: Chris Dee [cwdee]
// 0 !LDRAW_ORG Primitive UPDATE 2009-02
// 0 !LICENSE Licensed under CC BY 2.0 and CC BY 4.0 : see CAreadme.txt
// 
// 0 BFC CERTIFY CCW
  [0,"BFC","CERTIFY"],
  [0,"BFC","CCW"],
// 
// 0 !HISTORY 2009-09-03 [PTadmin] Official Update 2009-02
// 
// 
// 4 16 1 1 1 1 1 -1 -1 1 -1 -1 1 1
  [4,16,1,1,1,1,1,-1,-1,1,-1,-1,1,1],
// 4 16 -1 0 1 1 0 1 1 1 1 -1 1 1
  [4,16,-1,0,1,1,0,1,1,1,1,-1,1,1],
// 4 16 -1 0 -1 -1 0 1 -1 1 1 -1 1 -1
  [4,16,-1,0,-1,-1,0,1,-1,1,1,-1,1,-1],
// 4 16 1 0 -1 -1 0 -1 -1 1 -1 1 1 -1
  [4,16,1,0,-1,-1,0,-1,-1,1,-1,1,1,-1],
// 4 16 1 0 1 1 0 -1 1 1 -1 1 1 1
  [4,16,1,0,1,1,0,-1,1,1,-1,1,1,1],
// 0
];
module ldraw_lib__box5_12(step=0, col=false, unit=2/5, alt=false, line=0.2, solid=!$preview)
    makepoly(ldraw_lib__box5_12(), step=step, col=col, unit=unit, alt=alt, line=line, solid=solid);
ldraw_lib__box5_12(line=0.2);
// file: 3004.scad
use <../lib.scad>
use <s/3004s01.scad>
function ldraw_lib__3004() = [
// 0 Brick  1 x  2
// 0 Name: 3004.dat
// 0 Author: James Jessiman
// 0 !LDRAW_ORG Part UPDATE 2022-05
// 0 !LICENSE Licensed under CC BY 2.0 and CC BY 4.0 : see CAreadme.txt
// 
// 0 BFC CERTIFY CCW
  [0,"BFC","CERTIFY"],
  [0,"BFC","CCW"],
// 
// 0 !HISTORY 2001-10-26 [PTadmin] Official Update 2001-01
// 0 !HISTORY 2002-05-07 {unknown} BFC Certification
// 0 !HISTORY 2002-06-11 [PTadmin] Official Update 2002-03
// 0 !HISTORY 2007-05-07 [PTadmin] Header formatted for Contributor Agreement
// 0 !HISTORY 2008-07-01 [PTadmin] Official Update 2008-01
// 0 !HISTORY 2022-08-04 [MagFors] Using subfile
// 0 !HISTORY 2022-09-15 [PTadmin] Official Update 2022-05
// 
// 
// 1 16 0 0 0 1 0 0 0 1 0 0 0 1 s\3004s01.dat
  [1,16,0,0,0,1,0,0,0,1,0,0,0,1, ldraw_lib__s__3004s01()],
// 4 16 -20 24 -10 20 24 -10 20 0 -10 -20 0 -10
  [4,16,-20,24,-10,20,24,-10,20,0,-10,-20,0,-10],
];
module ldraw_lib__3004(step=0, col=false, unit=2/5, alt=false, line=0.2, solid=!$preview)
    makepoly(ldraw_lib__3004(), step=step, col=col, unit=unit, alt=alt, line=line, solid=solid);
ldraw_lib__3004(line=0.2);
// file: 004659f.scad
use <../lib.scad>
use <../p/box5-12.scad>
use <s/004452bs01.scad>
use <s/004452bs02.scad>
$fa=1; $fs=0.2;
function ldraw_lib__004659f(realsolid=false) = [
// 0 Sticker  1.1 x  1.9 with White Number "1" on Red Background
// 0 Name: 004659f.dat
// 0 Author: Alex Taylor [anathema]
// 0 !LDRAW_ORG Part UPDATE 2022-04
// 0 !LICENSE Licensed under CC BY 2.0 and CC BY 4.0 : see CAreadme.txt
// 
// 0 BFC CERTIFY CCW
  [0,"BFC","CERTIFY"],
  [0,"BFC","CCW"],
// 
// 0 !KEYWORDS Fire Station, Set 590-1
// 
// 0 !HISTORY 2019-09-08 [anathema] Original pattern using TEXMAP
// 0 !HISTORY 2021-03-09 [RainbowDolphin] Vectorized the pattern and used common subfile with 004452b
// 0 !HISTORY 2022-07-18 [PTadmin] Official Update 2022-04
// 
// 
// 1 16 0 -0.25 0 19 0 0 0 0.25 0 0 0 11 box5-12.dat
  [1,16,0,-0.25,0,19,0,0,0,0.25,0,0,0,11, ldraw_lib__box5_12(realsolid)],
// 1 15 0 0 0 1 0 0 0 1 0 0 0 1 s\004452bs01.dat
  [1,15,0,0,0,1,0,0,0,1,0,0,0,1, ldraw_lib__s__004452bs01(realsolid)],
// 1 4 0 0 0 1 0 0 0 1 0 0 0 1 s\004452bs02.dat
  [1,4,0,0,0,1,0,0,0,1,0,0,0,1, ldraw_lib__s__004452bs02(realsolid)],
];
module ldraw_lib__004659f(step=0, col=false, unit=2/5, alt=false, line=0.2, solid=!$preview)
    makepoly(ldraw_lib__004659f(solid), step=step, col=col, unit=unit, alt=alt, line=line, solid=solid);
ldraw_lib__004659f(line=0.2);
// main file
use <../lib.scad>
use <004659f.scad>
use <3004.scad>
function ldraw_lib__3004d09() = [
// 0 Brick  1 x  2 with White Number "1" on Red Background Sticker
// 0 Name: 3004d09.dat
// 0 Author: Takeshi Takahashi [RainbowDolphin]
// 0 !LDRAW_ORG Shortcut UPDATE 2024-04
// 0 !LICENSE Licensed under CC BY 4.0 : see CAreadme.txt
// 
// 0 BFC CERTIFY CCW
  [0,"BFC","CERTIFY"],
  [0,"BFC","CCW"],
// 
// 0 !CATEGORY Sticker Shortcut
// 0 !KEYWORDS Bricklink 3004pb208, Engine Co. No. 9, Fire Station, Set 590-1
// 
// 0 !HISTORY 2024-05-28 [OrionP] Official Update 2024-04
// 
// 1 16 0 0 0 1 0 0 0 1 0 0 0 1 3004.dat
  [1,16,0,0,0,1,0,0,0,1,0,0,0,1, ldraw_lib__3004()],
// 1 16 0 12 -10 1 0 0 0 0 -1 0 1 0 004659f.dat
  [1,16,0,12,-10,1,0,0,0,0,-1,0,1,0, ldraw_lib__004659f()],
];
module ldraw_lib__3004d09(step=0, col=false, unit=2/5, alt=false, line=0.2, solid=!$preview)
    makepoly(ldraw_lib__3004d09(), step=step, col=col, unit=unit, alt=alt, line=line, solid=solid);
ldraw_lib__3004d09(line=0.2);
